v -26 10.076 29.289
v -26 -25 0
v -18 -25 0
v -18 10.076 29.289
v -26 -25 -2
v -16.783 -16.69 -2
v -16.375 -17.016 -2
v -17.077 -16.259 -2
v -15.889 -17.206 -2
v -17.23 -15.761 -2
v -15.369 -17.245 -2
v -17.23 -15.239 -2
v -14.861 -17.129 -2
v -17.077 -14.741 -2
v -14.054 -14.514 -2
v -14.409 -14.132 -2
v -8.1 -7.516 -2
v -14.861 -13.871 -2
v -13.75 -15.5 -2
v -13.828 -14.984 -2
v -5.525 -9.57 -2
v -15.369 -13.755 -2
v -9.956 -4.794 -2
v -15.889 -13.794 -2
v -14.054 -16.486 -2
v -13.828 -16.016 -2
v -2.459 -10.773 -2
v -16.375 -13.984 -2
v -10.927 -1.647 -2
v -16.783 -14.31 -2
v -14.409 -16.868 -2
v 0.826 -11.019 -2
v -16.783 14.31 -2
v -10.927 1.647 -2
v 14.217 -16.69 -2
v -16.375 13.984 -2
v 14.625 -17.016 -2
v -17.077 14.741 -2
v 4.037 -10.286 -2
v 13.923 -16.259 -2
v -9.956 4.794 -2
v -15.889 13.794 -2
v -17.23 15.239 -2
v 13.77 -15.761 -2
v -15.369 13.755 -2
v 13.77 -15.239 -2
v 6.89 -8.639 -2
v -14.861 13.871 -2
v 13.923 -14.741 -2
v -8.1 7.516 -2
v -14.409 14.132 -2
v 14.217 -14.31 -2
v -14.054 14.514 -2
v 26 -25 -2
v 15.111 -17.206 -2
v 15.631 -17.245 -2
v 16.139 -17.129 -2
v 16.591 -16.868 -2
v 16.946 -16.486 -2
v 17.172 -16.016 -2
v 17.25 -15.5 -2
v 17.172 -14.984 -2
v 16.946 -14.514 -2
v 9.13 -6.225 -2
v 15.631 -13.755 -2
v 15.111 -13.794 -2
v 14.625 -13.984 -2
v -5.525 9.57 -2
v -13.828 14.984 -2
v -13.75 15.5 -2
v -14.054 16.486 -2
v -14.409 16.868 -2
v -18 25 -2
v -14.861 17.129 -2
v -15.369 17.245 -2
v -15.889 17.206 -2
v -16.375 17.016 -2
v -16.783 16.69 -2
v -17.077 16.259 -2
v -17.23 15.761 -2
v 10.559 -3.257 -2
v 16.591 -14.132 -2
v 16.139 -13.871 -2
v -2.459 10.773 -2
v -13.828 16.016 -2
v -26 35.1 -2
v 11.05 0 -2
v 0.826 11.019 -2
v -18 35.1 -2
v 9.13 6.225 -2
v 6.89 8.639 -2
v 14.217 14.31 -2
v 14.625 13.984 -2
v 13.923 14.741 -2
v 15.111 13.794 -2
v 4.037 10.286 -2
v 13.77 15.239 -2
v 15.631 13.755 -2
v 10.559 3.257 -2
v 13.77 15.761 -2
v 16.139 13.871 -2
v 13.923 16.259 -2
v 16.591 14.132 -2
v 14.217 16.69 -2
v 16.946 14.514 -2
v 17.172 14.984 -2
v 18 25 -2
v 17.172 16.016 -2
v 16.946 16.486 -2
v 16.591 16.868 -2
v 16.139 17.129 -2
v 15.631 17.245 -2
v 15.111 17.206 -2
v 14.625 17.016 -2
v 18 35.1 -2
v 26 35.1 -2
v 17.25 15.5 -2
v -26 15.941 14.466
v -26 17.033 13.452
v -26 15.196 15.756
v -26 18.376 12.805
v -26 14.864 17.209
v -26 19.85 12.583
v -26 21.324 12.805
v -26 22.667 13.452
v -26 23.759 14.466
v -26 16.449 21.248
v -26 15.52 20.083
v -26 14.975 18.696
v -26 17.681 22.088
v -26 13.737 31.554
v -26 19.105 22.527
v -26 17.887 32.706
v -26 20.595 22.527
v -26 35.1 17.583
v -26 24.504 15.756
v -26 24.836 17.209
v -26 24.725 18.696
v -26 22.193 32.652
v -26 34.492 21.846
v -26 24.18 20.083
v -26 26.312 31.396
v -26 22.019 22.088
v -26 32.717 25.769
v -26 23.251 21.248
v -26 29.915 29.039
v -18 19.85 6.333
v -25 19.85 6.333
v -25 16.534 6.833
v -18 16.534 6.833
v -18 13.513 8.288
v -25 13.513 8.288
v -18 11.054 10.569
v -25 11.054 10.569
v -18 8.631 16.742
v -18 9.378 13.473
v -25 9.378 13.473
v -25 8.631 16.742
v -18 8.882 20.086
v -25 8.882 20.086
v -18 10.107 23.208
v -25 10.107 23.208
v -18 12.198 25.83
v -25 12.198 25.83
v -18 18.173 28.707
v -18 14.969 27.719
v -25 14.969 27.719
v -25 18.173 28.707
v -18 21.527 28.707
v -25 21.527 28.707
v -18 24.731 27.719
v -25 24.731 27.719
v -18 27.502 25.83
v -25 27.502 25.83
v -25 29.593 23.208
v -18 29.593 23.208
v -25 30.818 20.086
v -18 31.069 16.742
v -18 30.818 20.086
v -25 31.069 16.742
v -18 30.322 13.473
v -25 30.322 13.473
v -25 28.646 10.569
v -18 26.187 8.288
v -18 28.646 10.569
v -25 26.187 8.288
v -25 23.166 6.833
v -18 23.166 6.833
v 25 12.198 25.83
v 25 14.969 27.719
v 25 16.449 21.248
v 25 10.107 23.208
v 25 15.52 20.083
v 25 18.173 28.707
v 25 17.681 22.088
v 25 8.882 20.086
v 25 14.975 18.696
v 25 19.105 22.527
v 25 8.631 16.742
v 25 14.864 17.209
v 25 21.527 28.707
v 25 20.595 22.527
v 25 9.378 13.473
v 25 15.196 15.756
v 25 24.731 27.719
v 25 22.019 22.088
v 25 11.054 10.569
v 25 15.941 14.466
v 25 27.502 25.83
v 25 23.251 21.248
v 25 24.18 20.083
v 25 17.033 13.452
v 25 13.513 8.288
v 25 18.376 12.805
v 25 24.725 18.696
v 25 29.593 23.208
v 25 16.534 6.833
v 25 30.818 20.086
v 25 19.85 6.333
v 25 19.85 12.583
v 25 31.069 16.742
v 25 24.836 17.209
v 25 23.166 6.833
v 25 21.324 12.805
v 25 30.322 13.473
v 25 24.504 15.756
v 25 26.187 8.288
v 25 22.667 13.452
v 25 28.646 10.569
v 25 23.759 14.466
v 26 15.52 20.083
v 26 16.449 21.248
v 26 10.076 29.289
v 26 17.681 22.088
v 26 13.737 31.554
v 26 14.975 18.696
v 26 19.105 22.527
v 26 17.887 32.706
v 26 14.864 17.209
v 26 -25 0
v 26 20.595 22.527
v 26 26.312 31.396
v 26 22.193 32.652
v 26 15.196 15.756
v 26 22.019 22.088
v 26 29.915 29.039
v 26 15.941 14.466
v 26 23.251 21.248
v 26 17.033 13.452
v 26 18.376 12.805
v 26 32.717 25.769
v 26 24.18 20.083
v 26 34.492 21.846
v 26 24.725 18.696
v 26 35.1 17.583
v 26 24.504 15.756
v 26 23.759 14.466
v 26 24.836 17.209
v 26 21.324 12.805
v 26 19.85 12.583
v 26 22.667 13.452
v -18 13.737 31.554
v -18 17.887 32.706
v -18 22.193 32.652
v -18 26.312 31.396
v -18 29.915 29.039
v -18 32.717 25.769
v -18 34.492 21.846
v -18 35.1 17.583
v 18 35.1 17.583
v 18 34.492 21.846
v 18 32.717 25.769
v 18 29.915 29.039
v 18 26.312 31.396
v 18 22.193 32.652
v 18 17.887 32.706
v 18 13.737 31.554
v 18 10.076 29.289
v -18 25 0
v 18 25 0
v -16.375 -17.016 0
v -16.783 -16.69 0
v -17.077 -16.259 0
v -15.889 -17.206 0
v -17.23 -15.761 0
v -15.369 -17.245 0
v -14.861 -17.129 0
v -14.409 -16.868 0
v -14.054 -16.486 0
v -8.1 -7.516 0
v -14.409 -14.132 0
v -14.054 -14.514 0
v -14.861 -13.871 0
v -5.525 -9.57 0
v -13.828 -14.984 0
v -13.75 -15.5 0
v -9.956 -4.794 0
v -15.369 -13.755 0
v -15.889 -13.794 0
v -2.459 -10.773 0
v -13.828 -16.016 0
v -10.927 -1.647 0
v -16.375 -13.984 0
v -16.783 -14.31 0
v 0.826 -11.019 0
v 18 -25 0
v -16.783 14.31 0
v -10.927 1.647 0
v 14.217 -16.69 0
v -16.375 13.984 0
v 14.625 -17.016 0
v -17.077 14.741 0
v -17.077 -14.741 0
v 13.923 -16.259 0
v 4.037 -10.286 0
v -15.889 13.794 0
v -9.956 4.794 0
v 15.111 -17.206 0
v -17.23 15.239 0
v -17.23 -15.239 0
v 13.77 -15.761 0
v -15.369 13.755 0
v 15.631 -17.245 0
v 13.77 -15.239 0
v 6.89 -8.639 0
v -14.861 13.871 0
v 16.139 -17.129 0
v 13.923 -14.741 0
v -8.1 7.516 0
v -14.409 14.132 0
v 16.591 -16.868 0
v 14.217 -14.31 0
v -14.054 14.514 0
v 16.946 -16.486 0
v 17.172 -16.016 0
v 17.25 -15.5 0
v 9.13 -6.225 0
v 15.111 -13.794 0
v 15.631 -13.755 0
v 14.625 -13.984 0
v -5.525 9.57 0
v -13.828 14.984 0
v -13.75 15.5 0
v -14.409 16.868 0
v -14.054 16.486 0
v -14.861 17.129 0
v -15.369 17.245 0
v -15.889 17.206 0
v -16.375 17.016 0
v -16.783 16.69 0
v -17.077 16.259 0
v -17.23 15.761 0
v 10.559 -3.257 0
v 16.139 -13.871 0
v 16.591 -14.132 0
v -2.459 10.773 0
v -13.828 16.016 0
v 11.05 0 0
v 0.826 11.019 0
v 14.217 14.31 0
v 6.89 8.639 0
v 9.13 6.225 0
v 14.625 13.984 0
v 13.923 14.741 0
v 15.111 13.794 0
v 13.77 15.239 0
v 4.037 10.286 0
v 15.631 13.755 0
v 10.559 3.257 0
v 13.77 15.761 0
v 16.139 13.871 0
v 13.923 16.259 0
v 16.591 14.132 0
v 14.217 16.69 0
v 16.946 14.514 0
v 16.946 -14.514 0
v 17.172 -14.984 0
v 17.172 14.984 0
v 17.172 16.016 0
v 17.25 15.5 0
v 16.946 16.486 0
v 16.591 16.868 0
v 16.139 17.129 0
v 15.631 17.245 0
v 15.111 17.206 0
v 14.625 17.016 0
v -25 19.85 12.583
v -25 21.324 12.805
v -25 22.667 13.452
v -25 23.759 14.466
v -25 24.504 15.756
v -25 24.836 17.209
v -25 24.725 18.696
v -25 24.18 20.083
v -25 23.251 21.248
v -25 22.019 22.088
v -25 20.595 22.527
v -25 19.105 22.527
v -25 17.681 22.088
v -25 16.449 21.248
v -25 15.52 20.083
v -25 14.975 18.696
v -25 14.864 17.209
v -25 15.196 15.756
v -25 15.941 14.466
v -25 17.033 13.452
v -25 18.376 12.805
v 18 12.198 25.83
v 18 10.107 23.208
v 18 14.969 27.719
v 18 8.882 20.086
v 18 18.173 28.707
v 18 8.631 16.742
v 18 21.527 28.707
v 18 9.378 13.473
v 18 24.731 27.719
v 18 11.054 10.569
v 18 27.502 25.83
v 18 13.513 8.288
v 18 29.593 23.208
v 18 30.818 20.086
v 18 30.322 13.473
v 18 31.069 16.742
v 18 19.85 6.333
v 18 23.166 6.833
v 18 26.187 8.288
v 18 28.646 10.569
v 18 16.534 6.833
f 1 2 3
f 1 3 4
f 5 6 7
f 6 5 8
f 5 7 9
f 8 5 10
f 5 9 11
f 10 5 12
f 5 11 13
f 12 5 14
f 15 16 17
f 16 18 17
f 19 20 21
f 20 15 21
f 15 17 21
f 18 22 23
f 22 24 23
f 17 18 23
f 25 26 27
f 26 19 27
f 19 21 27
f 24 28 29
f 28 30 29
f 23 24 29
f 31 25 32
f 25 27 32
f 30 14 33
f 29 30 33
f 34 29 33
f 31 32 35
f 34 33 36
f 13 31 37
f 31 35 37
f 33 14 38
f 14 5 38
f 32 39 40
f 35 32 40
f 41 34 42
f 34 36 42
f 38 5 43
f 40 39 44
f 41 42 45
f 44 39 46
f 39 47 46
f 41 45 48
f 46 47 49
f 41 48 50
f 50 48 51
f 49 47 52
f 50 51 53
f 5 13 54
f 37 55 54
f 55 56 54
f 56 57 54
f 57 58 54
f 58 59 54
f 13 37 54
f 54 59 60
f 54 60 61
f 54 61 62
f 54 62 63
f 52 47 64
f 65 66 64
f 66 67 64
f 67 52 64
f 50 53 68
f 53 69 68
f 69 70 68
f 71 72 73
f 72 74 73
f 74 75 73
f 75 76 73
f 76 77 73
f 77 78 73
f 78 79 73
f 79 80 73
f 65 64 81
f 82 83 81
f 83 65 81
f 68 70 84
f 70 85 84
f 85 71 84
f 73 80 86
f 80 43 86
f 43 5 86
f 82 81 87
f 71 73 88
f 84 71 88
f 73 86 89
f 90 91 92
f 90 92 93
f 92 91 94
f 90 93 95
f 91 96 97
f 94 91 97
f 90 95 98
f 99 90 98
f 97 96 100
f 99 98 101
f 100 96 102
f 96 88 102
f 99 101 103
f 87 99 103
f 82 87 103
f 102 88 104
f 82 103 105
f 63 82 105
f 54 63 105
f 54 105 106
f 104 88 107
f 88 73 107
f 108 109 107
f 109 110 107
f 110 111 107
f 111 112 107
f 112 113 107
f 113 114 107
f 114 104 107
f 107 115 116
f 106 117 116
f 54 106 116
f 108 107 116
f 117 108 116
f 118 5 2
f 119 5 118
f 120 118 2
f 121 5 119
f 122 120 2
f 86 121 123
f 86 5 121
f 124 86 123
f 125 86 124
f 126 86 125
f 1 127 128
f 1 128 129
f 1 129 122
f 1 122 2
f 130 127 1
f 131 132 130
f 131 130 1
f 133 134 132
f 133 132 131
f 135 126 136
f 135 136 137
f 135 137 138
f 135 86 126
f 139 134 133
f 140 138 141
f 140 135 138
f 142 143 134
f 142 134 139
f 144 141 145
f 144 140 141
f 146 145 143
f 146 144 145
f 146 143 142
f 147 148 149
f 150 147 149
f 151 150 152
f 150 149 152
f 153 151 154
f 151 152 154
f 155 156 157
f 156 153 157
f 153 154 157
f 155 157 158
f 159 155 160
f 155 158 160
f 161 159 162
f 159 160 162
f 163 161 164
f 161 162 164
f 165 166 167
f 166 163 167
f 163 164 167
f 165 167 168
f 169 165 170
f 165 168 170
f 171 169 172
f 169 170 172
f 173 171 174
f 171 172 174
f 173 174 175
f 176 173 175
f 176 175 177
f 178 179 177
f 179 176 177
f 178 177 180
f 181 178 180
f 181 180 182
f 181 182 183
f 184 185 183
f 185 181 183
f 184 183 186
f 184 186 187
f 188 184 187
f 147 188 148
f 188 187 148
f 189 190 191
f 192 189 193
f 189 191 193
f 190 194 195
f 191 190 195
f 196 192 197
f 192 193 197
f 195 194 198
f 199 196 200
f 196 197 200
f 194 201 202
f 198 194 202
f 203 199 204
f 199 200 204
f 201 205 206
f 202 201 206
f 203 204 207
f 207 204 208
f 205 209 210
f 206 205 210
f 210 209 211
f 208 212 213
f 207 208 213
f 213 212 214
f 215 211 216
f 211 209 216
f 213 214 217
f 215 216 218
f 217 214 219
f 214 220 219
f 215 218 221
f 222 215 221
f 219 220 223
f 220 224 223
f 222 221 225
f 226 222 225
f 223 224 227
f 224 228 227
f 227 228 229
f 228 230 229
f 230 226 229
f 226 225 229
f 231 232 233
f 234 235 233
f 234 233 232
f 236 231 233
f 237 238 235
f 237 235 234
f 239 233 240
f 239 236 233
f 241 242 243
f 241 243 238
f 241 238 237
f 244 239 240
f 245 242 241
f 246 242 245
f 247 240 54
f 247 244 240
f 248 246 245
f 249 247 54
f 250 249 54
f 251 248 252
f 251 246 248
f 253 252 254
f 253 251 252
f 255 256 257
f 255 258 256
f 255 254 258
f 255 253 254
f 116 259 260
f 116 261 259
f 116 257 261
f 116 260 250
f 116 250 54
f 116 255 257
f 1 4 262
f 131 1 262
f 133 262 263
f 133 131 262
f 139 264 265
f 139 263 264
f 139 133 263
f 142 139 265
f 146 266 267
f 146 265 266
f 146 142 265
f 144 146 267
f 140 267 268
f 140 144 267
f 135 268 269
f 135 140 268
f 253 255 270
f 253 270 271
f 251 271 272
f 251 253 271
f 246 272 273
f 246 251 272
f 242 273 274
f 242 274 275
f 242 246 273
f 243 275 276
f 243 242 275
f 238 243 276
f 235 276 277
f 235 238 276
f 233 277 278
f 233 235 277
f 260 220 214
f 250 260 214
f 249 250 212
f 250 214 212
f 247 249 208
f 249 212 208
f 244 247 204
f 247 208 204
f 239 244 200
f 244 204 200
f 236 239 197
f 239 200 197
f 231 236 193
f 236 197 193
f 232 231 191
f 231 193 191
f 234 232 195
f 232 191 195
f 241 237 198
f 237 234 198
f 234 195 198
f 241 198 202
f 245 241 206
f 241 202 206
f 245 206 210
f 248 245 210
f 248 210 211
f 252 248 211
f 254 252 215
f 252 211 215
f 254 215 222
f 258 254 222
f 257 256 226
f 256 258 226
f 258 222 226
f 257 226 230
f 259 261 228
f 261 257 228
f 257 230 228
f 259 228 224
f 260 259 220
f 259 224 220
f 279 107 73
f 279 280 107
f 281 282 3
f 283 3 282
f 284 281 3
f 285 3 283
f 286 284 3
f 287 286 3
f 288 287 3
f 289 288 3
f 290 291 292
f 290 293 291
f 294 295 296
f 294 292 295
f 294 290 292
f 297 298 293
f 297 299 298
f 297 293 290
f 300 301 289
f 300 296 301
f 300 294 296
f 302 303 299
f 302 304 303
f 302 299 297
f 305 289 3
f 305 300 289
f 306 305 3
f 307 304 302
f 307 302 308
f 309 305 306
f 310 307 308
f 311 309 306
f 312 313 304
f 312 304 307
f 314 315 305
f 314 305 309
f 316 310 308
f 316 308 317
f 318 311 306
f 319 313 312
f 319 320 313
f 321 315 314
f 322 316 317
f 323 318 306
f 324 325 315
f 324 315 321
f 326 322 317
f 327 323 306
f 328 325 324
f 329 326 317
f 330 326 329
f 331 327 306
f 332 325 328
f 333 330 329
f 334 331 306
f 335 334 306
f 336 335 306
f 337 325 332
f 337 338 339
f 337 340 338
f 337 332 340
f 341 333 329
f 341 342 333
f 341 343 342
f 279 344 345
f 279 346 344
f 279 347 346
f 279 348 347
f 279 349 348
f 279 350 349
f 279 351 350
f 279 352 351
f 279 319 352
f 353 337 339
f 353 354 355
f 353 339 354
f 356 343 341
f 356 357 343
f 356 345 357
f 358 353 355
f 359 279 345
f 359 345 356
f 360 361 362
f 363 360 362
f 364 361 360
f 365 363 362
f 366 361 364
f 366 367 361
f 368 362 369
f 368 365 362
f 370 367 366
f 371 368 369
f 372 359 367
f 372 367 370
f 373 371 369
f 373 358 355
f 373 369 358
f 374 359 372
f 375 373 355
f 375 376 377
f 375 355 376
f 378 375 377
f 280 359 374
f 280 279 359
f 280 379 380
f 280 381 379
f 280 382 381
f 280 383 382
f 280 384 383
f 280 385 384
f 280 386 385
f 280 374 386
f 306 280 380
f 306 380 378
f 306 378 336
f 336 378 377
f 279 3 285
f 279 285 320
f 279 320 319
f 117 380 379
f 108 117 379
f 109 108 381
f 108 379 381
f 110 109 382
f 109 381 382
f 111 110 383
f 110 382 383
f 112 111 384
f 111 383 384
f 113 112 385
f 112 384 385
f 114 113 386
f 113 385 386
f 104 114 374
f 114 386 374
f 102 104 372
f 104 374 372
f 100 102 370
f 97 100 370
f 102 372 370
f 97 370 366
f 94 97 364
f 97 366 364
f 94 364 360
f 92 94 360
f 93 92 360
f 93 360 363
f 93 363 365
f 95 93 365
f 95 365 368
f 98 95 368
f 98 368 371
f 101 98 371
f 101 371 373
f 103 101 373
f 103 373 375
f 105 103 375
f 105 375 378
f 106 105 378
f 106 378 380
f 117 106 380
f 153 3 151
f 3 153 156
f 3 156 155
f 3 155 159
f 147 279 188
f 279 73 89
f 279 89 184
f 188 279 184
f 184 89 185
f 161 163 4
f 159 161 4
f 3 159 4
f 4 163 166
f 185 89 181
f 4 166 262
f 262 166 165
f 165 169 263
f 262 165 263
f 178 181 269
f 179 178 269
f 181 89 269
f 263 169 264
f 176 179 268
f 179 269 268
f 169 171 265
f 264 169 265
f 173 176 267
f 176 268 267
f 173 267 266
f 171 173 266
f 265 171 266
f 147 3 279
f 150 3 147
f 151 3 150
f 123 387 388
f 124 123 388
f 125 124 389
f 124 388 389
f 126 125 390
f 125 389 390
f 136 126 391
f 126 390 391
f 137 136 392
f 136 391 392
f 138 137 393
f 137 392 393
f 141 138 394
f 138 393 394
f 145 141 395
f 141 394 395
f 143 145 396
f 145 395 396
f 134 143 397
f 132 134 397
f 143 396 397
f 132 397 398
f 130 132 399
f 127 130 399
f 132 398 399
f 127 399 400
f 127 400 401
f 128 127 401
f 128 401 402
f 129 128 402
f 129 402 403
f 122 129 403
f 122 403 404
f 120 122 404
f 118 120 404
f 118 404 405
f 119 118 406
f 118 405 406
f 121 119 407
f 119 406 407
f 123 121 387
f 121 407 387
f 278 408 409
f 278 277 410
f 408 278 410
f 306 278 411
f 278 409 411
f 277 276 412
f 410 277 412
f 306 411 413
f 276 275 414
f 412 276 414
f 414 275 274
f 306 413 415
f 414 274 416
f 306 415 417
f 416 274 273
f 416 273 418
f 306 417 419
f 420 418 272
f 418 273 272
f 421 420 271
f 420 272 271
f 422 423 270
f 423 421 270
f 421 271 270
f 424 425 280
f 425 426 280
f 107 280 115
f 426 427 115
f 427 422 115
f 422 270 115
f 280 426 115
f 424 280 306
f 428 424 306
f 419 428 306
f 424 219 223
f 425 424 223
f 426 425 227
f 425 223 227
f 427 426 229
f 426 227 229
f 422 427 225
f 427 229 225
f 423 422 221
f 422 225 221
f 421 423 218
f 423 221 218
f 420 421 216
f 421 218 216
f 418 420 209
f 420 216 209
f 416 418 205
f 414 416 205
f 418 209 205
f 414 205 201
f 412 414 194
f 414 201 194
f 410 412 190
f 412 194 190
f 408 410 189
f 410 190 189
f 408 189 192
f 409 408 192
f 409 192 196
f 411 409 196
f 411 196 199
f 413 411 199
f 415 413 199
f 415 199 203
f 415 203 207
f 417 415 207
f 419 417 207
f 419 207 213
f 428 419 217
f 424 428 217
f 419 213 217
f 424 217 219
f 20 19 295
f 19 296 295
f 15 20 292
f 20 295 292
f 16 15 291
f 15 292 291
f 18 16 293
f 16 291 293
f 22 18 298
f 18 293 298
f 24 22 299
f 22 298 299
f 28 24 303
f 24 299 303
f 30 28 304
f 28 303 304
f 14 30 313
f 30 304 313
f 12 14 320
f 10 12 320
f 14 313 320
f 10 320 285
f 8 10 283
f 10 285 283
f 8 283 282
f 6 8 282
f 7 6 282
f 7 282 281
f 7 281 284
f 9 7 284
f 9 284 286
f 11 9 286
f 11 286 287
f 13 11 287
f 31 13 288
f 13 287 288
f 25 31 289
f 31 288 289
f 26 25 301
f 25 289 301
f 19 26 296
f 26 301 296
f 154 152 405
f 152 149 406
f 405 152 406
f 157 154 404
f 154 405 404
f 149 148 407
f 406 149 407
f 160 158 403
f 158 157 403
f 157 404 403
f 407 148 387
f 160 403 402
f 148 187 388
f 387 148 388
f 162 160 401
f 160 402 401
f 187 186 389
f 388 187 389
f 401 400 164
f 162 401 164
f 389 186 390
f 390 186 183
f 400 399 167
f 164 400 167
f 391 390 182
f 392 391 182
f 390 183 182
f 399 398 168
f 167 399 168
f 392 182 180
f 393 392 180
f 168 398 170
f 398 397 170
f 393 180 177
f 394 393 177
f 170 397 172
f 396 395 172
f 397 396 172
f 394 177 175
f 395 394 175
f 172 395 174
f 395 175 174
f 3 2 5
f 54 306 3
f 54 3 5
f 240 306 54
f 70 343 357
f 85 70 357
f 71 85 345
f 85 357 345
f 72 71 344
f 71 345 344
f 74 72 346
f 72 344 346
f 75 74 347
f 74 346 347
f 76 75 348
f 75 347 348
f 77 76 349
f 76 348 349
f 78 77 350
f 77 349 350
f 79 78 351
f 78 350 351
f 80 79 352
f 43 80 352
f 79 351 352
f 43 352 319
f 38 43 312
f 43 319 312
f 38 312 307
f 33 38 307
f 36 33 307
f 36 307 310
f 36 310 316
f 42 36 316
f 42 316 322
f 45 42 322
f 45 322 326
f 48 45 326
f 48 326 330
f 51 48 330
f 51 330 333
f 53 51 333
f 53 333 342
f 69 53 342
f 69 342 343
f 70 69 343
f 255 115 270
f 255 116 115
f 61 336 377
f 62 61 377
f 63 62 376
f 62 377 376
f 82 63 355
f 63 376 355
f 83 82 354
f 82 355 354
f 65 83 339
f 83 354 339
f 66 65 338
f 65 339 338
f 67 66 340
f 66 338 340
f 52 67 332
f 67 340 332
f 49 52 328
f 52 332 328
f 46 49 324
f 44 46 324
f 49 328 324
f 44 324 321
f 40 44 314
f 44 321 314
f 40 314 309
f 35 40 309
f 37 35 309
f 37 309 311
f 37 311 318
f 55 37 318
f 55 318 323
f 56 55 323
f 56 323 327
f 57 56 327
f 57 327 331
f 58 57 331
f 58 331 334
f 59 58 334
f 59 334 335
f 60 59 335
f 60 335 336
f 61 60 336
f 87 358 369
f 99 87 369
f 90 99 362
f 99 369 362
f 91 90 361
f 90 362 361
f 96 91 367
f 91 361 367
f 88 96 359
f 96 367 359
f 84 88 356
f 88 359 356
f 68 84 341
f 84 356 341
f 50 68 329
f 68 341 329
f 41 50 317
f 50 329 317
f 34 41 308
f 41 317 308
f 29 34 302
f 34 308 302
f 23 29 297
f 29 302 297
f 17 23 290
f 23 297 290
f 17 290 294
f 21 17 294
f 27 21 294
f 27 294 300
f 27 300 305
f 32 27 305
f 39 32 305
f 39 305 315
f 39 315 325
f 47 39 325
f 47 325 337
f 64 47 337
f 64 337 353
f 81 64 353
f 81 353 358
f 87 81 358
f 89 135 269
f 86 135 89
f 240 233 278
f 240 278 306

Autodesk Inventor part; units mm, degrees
ref_plane "YZ Plane" through (0, 0, 0) normal (1, 0, 0) x (0, 1, 0)
ref_plane "XZ Plane" through (0, 0, 0) normal (0, 1, 0) x (-1, 0, 0)
ref_plane "XY Plane" through (0, 0, 0) normal (0, 0, 1) x (1, 0, 0)
sketch "Sketch1" plane through (0, 0, 0) normal (0, 0, 1) x (1, 0, 0)
  circle A0 centre (-15.5, 15.5) radius 1.75
  circle A1 centre (15.5, 15.5) radius 1.75
  circle A2 centre (-15.5, -15.5) radius 1.75
  circle A3 centre (15.5, -15.5) radius 1.75
  circle A4 centre (0, 0) radius 11.05
  line L0 (-15.5, 15.5) -> (15.5, 15.5) construction
  line L1 (15.5, 15.5) -> (15.5, -15.5) construction
  line L2 (15.5, -15.5) -> (-15.5, -15.5) construction
  line L3 (-15.5, -15.5) -> (-15.5, 15.5) construction
  line L4 (-15.5, 15.5) -> (15.5, -15.5) construction
  line L5 (15.5, 15.5) -> (-15.5, -15.5) construction
  line L6 (-25, 25) -> (-25, -25)
  line L7 (-25, -25) -> (25, -25)
  line L8 (25, -25) -> (25, 25)
  line L9 (25, 25) -> (-25, 25)
  dimension "d0" = 22.1
  dimension "d1" = 31
  dimension "d2" = 31
  dimension "d3" = 3.5
  dimension "d4" = 50
  dimension "d5" = 50
extrude "Extrusion1" add sketch "Sketch1" against normal blind 2
sketch "Sketch2" plane through (25, -25, 0) normal (1, 0, 0) x (0, 0, -1)
  line L0 (0, 0) -> (0, 50) projected
  line L1 (0, 0) -> (2, 0) projected
  line L2 (2, 50) -> (2, 0) projected
  line L3 (0, 50) -> (2, 50) projected
  line L4 (0, 0) -> (0, 50) projected
  line L5 (0, 60.1) -> (-17.583, 60.1)
  line L6 (-29.2887, 35.0756) -> (0, 0)
  line L7 (0, 38.75) -> (0, 42.25) construction
  line L8 (0, 44.85) -> (-34.6915, 44.85) construction
  line L9 (2, 50) -> (2, 60.1)
  line L10 (2, 60.1) -> (0, 60.1)
  circle A0 centre (-17.583, 44.85) radius 5
  circle A1 centre (-17.583, 44.85) radius 11.25
  circle A2 centre (-17.583, 44.85) radius 13.25
  arc A3 (-17.583, 60.1) -> (-29.2887, 35.0756) centre (-17.583, 44.85) ccw
  point P0 (0, 25)
  dimension "d8" = 19.85
  dimension "d9" = 19.583
  dimension "d10" = 10
  dimension "d11" = 22.5
  dimension "d12" = 2
  dimension "d13" = 2
extrude "Extrusion2" add sketch "Sketch2" against normal blind 7 contours L6 A3 L5 L10 L9 L3 L0 | A2
extrude "Extrusion3" add sketch "Sketch2" along normal blind 1 contours L6 A3 L5 L10 L9 L3 L0 | L0 L3 L2 L1 | A1 | A2
mirror "Mirror1" about plane through (0, 0, 0) normal (1, 0, 0) of "Extrusion2", "Extrusion3"
properties part number "Worm Gear Box" material "PC/ABS Plastic"
